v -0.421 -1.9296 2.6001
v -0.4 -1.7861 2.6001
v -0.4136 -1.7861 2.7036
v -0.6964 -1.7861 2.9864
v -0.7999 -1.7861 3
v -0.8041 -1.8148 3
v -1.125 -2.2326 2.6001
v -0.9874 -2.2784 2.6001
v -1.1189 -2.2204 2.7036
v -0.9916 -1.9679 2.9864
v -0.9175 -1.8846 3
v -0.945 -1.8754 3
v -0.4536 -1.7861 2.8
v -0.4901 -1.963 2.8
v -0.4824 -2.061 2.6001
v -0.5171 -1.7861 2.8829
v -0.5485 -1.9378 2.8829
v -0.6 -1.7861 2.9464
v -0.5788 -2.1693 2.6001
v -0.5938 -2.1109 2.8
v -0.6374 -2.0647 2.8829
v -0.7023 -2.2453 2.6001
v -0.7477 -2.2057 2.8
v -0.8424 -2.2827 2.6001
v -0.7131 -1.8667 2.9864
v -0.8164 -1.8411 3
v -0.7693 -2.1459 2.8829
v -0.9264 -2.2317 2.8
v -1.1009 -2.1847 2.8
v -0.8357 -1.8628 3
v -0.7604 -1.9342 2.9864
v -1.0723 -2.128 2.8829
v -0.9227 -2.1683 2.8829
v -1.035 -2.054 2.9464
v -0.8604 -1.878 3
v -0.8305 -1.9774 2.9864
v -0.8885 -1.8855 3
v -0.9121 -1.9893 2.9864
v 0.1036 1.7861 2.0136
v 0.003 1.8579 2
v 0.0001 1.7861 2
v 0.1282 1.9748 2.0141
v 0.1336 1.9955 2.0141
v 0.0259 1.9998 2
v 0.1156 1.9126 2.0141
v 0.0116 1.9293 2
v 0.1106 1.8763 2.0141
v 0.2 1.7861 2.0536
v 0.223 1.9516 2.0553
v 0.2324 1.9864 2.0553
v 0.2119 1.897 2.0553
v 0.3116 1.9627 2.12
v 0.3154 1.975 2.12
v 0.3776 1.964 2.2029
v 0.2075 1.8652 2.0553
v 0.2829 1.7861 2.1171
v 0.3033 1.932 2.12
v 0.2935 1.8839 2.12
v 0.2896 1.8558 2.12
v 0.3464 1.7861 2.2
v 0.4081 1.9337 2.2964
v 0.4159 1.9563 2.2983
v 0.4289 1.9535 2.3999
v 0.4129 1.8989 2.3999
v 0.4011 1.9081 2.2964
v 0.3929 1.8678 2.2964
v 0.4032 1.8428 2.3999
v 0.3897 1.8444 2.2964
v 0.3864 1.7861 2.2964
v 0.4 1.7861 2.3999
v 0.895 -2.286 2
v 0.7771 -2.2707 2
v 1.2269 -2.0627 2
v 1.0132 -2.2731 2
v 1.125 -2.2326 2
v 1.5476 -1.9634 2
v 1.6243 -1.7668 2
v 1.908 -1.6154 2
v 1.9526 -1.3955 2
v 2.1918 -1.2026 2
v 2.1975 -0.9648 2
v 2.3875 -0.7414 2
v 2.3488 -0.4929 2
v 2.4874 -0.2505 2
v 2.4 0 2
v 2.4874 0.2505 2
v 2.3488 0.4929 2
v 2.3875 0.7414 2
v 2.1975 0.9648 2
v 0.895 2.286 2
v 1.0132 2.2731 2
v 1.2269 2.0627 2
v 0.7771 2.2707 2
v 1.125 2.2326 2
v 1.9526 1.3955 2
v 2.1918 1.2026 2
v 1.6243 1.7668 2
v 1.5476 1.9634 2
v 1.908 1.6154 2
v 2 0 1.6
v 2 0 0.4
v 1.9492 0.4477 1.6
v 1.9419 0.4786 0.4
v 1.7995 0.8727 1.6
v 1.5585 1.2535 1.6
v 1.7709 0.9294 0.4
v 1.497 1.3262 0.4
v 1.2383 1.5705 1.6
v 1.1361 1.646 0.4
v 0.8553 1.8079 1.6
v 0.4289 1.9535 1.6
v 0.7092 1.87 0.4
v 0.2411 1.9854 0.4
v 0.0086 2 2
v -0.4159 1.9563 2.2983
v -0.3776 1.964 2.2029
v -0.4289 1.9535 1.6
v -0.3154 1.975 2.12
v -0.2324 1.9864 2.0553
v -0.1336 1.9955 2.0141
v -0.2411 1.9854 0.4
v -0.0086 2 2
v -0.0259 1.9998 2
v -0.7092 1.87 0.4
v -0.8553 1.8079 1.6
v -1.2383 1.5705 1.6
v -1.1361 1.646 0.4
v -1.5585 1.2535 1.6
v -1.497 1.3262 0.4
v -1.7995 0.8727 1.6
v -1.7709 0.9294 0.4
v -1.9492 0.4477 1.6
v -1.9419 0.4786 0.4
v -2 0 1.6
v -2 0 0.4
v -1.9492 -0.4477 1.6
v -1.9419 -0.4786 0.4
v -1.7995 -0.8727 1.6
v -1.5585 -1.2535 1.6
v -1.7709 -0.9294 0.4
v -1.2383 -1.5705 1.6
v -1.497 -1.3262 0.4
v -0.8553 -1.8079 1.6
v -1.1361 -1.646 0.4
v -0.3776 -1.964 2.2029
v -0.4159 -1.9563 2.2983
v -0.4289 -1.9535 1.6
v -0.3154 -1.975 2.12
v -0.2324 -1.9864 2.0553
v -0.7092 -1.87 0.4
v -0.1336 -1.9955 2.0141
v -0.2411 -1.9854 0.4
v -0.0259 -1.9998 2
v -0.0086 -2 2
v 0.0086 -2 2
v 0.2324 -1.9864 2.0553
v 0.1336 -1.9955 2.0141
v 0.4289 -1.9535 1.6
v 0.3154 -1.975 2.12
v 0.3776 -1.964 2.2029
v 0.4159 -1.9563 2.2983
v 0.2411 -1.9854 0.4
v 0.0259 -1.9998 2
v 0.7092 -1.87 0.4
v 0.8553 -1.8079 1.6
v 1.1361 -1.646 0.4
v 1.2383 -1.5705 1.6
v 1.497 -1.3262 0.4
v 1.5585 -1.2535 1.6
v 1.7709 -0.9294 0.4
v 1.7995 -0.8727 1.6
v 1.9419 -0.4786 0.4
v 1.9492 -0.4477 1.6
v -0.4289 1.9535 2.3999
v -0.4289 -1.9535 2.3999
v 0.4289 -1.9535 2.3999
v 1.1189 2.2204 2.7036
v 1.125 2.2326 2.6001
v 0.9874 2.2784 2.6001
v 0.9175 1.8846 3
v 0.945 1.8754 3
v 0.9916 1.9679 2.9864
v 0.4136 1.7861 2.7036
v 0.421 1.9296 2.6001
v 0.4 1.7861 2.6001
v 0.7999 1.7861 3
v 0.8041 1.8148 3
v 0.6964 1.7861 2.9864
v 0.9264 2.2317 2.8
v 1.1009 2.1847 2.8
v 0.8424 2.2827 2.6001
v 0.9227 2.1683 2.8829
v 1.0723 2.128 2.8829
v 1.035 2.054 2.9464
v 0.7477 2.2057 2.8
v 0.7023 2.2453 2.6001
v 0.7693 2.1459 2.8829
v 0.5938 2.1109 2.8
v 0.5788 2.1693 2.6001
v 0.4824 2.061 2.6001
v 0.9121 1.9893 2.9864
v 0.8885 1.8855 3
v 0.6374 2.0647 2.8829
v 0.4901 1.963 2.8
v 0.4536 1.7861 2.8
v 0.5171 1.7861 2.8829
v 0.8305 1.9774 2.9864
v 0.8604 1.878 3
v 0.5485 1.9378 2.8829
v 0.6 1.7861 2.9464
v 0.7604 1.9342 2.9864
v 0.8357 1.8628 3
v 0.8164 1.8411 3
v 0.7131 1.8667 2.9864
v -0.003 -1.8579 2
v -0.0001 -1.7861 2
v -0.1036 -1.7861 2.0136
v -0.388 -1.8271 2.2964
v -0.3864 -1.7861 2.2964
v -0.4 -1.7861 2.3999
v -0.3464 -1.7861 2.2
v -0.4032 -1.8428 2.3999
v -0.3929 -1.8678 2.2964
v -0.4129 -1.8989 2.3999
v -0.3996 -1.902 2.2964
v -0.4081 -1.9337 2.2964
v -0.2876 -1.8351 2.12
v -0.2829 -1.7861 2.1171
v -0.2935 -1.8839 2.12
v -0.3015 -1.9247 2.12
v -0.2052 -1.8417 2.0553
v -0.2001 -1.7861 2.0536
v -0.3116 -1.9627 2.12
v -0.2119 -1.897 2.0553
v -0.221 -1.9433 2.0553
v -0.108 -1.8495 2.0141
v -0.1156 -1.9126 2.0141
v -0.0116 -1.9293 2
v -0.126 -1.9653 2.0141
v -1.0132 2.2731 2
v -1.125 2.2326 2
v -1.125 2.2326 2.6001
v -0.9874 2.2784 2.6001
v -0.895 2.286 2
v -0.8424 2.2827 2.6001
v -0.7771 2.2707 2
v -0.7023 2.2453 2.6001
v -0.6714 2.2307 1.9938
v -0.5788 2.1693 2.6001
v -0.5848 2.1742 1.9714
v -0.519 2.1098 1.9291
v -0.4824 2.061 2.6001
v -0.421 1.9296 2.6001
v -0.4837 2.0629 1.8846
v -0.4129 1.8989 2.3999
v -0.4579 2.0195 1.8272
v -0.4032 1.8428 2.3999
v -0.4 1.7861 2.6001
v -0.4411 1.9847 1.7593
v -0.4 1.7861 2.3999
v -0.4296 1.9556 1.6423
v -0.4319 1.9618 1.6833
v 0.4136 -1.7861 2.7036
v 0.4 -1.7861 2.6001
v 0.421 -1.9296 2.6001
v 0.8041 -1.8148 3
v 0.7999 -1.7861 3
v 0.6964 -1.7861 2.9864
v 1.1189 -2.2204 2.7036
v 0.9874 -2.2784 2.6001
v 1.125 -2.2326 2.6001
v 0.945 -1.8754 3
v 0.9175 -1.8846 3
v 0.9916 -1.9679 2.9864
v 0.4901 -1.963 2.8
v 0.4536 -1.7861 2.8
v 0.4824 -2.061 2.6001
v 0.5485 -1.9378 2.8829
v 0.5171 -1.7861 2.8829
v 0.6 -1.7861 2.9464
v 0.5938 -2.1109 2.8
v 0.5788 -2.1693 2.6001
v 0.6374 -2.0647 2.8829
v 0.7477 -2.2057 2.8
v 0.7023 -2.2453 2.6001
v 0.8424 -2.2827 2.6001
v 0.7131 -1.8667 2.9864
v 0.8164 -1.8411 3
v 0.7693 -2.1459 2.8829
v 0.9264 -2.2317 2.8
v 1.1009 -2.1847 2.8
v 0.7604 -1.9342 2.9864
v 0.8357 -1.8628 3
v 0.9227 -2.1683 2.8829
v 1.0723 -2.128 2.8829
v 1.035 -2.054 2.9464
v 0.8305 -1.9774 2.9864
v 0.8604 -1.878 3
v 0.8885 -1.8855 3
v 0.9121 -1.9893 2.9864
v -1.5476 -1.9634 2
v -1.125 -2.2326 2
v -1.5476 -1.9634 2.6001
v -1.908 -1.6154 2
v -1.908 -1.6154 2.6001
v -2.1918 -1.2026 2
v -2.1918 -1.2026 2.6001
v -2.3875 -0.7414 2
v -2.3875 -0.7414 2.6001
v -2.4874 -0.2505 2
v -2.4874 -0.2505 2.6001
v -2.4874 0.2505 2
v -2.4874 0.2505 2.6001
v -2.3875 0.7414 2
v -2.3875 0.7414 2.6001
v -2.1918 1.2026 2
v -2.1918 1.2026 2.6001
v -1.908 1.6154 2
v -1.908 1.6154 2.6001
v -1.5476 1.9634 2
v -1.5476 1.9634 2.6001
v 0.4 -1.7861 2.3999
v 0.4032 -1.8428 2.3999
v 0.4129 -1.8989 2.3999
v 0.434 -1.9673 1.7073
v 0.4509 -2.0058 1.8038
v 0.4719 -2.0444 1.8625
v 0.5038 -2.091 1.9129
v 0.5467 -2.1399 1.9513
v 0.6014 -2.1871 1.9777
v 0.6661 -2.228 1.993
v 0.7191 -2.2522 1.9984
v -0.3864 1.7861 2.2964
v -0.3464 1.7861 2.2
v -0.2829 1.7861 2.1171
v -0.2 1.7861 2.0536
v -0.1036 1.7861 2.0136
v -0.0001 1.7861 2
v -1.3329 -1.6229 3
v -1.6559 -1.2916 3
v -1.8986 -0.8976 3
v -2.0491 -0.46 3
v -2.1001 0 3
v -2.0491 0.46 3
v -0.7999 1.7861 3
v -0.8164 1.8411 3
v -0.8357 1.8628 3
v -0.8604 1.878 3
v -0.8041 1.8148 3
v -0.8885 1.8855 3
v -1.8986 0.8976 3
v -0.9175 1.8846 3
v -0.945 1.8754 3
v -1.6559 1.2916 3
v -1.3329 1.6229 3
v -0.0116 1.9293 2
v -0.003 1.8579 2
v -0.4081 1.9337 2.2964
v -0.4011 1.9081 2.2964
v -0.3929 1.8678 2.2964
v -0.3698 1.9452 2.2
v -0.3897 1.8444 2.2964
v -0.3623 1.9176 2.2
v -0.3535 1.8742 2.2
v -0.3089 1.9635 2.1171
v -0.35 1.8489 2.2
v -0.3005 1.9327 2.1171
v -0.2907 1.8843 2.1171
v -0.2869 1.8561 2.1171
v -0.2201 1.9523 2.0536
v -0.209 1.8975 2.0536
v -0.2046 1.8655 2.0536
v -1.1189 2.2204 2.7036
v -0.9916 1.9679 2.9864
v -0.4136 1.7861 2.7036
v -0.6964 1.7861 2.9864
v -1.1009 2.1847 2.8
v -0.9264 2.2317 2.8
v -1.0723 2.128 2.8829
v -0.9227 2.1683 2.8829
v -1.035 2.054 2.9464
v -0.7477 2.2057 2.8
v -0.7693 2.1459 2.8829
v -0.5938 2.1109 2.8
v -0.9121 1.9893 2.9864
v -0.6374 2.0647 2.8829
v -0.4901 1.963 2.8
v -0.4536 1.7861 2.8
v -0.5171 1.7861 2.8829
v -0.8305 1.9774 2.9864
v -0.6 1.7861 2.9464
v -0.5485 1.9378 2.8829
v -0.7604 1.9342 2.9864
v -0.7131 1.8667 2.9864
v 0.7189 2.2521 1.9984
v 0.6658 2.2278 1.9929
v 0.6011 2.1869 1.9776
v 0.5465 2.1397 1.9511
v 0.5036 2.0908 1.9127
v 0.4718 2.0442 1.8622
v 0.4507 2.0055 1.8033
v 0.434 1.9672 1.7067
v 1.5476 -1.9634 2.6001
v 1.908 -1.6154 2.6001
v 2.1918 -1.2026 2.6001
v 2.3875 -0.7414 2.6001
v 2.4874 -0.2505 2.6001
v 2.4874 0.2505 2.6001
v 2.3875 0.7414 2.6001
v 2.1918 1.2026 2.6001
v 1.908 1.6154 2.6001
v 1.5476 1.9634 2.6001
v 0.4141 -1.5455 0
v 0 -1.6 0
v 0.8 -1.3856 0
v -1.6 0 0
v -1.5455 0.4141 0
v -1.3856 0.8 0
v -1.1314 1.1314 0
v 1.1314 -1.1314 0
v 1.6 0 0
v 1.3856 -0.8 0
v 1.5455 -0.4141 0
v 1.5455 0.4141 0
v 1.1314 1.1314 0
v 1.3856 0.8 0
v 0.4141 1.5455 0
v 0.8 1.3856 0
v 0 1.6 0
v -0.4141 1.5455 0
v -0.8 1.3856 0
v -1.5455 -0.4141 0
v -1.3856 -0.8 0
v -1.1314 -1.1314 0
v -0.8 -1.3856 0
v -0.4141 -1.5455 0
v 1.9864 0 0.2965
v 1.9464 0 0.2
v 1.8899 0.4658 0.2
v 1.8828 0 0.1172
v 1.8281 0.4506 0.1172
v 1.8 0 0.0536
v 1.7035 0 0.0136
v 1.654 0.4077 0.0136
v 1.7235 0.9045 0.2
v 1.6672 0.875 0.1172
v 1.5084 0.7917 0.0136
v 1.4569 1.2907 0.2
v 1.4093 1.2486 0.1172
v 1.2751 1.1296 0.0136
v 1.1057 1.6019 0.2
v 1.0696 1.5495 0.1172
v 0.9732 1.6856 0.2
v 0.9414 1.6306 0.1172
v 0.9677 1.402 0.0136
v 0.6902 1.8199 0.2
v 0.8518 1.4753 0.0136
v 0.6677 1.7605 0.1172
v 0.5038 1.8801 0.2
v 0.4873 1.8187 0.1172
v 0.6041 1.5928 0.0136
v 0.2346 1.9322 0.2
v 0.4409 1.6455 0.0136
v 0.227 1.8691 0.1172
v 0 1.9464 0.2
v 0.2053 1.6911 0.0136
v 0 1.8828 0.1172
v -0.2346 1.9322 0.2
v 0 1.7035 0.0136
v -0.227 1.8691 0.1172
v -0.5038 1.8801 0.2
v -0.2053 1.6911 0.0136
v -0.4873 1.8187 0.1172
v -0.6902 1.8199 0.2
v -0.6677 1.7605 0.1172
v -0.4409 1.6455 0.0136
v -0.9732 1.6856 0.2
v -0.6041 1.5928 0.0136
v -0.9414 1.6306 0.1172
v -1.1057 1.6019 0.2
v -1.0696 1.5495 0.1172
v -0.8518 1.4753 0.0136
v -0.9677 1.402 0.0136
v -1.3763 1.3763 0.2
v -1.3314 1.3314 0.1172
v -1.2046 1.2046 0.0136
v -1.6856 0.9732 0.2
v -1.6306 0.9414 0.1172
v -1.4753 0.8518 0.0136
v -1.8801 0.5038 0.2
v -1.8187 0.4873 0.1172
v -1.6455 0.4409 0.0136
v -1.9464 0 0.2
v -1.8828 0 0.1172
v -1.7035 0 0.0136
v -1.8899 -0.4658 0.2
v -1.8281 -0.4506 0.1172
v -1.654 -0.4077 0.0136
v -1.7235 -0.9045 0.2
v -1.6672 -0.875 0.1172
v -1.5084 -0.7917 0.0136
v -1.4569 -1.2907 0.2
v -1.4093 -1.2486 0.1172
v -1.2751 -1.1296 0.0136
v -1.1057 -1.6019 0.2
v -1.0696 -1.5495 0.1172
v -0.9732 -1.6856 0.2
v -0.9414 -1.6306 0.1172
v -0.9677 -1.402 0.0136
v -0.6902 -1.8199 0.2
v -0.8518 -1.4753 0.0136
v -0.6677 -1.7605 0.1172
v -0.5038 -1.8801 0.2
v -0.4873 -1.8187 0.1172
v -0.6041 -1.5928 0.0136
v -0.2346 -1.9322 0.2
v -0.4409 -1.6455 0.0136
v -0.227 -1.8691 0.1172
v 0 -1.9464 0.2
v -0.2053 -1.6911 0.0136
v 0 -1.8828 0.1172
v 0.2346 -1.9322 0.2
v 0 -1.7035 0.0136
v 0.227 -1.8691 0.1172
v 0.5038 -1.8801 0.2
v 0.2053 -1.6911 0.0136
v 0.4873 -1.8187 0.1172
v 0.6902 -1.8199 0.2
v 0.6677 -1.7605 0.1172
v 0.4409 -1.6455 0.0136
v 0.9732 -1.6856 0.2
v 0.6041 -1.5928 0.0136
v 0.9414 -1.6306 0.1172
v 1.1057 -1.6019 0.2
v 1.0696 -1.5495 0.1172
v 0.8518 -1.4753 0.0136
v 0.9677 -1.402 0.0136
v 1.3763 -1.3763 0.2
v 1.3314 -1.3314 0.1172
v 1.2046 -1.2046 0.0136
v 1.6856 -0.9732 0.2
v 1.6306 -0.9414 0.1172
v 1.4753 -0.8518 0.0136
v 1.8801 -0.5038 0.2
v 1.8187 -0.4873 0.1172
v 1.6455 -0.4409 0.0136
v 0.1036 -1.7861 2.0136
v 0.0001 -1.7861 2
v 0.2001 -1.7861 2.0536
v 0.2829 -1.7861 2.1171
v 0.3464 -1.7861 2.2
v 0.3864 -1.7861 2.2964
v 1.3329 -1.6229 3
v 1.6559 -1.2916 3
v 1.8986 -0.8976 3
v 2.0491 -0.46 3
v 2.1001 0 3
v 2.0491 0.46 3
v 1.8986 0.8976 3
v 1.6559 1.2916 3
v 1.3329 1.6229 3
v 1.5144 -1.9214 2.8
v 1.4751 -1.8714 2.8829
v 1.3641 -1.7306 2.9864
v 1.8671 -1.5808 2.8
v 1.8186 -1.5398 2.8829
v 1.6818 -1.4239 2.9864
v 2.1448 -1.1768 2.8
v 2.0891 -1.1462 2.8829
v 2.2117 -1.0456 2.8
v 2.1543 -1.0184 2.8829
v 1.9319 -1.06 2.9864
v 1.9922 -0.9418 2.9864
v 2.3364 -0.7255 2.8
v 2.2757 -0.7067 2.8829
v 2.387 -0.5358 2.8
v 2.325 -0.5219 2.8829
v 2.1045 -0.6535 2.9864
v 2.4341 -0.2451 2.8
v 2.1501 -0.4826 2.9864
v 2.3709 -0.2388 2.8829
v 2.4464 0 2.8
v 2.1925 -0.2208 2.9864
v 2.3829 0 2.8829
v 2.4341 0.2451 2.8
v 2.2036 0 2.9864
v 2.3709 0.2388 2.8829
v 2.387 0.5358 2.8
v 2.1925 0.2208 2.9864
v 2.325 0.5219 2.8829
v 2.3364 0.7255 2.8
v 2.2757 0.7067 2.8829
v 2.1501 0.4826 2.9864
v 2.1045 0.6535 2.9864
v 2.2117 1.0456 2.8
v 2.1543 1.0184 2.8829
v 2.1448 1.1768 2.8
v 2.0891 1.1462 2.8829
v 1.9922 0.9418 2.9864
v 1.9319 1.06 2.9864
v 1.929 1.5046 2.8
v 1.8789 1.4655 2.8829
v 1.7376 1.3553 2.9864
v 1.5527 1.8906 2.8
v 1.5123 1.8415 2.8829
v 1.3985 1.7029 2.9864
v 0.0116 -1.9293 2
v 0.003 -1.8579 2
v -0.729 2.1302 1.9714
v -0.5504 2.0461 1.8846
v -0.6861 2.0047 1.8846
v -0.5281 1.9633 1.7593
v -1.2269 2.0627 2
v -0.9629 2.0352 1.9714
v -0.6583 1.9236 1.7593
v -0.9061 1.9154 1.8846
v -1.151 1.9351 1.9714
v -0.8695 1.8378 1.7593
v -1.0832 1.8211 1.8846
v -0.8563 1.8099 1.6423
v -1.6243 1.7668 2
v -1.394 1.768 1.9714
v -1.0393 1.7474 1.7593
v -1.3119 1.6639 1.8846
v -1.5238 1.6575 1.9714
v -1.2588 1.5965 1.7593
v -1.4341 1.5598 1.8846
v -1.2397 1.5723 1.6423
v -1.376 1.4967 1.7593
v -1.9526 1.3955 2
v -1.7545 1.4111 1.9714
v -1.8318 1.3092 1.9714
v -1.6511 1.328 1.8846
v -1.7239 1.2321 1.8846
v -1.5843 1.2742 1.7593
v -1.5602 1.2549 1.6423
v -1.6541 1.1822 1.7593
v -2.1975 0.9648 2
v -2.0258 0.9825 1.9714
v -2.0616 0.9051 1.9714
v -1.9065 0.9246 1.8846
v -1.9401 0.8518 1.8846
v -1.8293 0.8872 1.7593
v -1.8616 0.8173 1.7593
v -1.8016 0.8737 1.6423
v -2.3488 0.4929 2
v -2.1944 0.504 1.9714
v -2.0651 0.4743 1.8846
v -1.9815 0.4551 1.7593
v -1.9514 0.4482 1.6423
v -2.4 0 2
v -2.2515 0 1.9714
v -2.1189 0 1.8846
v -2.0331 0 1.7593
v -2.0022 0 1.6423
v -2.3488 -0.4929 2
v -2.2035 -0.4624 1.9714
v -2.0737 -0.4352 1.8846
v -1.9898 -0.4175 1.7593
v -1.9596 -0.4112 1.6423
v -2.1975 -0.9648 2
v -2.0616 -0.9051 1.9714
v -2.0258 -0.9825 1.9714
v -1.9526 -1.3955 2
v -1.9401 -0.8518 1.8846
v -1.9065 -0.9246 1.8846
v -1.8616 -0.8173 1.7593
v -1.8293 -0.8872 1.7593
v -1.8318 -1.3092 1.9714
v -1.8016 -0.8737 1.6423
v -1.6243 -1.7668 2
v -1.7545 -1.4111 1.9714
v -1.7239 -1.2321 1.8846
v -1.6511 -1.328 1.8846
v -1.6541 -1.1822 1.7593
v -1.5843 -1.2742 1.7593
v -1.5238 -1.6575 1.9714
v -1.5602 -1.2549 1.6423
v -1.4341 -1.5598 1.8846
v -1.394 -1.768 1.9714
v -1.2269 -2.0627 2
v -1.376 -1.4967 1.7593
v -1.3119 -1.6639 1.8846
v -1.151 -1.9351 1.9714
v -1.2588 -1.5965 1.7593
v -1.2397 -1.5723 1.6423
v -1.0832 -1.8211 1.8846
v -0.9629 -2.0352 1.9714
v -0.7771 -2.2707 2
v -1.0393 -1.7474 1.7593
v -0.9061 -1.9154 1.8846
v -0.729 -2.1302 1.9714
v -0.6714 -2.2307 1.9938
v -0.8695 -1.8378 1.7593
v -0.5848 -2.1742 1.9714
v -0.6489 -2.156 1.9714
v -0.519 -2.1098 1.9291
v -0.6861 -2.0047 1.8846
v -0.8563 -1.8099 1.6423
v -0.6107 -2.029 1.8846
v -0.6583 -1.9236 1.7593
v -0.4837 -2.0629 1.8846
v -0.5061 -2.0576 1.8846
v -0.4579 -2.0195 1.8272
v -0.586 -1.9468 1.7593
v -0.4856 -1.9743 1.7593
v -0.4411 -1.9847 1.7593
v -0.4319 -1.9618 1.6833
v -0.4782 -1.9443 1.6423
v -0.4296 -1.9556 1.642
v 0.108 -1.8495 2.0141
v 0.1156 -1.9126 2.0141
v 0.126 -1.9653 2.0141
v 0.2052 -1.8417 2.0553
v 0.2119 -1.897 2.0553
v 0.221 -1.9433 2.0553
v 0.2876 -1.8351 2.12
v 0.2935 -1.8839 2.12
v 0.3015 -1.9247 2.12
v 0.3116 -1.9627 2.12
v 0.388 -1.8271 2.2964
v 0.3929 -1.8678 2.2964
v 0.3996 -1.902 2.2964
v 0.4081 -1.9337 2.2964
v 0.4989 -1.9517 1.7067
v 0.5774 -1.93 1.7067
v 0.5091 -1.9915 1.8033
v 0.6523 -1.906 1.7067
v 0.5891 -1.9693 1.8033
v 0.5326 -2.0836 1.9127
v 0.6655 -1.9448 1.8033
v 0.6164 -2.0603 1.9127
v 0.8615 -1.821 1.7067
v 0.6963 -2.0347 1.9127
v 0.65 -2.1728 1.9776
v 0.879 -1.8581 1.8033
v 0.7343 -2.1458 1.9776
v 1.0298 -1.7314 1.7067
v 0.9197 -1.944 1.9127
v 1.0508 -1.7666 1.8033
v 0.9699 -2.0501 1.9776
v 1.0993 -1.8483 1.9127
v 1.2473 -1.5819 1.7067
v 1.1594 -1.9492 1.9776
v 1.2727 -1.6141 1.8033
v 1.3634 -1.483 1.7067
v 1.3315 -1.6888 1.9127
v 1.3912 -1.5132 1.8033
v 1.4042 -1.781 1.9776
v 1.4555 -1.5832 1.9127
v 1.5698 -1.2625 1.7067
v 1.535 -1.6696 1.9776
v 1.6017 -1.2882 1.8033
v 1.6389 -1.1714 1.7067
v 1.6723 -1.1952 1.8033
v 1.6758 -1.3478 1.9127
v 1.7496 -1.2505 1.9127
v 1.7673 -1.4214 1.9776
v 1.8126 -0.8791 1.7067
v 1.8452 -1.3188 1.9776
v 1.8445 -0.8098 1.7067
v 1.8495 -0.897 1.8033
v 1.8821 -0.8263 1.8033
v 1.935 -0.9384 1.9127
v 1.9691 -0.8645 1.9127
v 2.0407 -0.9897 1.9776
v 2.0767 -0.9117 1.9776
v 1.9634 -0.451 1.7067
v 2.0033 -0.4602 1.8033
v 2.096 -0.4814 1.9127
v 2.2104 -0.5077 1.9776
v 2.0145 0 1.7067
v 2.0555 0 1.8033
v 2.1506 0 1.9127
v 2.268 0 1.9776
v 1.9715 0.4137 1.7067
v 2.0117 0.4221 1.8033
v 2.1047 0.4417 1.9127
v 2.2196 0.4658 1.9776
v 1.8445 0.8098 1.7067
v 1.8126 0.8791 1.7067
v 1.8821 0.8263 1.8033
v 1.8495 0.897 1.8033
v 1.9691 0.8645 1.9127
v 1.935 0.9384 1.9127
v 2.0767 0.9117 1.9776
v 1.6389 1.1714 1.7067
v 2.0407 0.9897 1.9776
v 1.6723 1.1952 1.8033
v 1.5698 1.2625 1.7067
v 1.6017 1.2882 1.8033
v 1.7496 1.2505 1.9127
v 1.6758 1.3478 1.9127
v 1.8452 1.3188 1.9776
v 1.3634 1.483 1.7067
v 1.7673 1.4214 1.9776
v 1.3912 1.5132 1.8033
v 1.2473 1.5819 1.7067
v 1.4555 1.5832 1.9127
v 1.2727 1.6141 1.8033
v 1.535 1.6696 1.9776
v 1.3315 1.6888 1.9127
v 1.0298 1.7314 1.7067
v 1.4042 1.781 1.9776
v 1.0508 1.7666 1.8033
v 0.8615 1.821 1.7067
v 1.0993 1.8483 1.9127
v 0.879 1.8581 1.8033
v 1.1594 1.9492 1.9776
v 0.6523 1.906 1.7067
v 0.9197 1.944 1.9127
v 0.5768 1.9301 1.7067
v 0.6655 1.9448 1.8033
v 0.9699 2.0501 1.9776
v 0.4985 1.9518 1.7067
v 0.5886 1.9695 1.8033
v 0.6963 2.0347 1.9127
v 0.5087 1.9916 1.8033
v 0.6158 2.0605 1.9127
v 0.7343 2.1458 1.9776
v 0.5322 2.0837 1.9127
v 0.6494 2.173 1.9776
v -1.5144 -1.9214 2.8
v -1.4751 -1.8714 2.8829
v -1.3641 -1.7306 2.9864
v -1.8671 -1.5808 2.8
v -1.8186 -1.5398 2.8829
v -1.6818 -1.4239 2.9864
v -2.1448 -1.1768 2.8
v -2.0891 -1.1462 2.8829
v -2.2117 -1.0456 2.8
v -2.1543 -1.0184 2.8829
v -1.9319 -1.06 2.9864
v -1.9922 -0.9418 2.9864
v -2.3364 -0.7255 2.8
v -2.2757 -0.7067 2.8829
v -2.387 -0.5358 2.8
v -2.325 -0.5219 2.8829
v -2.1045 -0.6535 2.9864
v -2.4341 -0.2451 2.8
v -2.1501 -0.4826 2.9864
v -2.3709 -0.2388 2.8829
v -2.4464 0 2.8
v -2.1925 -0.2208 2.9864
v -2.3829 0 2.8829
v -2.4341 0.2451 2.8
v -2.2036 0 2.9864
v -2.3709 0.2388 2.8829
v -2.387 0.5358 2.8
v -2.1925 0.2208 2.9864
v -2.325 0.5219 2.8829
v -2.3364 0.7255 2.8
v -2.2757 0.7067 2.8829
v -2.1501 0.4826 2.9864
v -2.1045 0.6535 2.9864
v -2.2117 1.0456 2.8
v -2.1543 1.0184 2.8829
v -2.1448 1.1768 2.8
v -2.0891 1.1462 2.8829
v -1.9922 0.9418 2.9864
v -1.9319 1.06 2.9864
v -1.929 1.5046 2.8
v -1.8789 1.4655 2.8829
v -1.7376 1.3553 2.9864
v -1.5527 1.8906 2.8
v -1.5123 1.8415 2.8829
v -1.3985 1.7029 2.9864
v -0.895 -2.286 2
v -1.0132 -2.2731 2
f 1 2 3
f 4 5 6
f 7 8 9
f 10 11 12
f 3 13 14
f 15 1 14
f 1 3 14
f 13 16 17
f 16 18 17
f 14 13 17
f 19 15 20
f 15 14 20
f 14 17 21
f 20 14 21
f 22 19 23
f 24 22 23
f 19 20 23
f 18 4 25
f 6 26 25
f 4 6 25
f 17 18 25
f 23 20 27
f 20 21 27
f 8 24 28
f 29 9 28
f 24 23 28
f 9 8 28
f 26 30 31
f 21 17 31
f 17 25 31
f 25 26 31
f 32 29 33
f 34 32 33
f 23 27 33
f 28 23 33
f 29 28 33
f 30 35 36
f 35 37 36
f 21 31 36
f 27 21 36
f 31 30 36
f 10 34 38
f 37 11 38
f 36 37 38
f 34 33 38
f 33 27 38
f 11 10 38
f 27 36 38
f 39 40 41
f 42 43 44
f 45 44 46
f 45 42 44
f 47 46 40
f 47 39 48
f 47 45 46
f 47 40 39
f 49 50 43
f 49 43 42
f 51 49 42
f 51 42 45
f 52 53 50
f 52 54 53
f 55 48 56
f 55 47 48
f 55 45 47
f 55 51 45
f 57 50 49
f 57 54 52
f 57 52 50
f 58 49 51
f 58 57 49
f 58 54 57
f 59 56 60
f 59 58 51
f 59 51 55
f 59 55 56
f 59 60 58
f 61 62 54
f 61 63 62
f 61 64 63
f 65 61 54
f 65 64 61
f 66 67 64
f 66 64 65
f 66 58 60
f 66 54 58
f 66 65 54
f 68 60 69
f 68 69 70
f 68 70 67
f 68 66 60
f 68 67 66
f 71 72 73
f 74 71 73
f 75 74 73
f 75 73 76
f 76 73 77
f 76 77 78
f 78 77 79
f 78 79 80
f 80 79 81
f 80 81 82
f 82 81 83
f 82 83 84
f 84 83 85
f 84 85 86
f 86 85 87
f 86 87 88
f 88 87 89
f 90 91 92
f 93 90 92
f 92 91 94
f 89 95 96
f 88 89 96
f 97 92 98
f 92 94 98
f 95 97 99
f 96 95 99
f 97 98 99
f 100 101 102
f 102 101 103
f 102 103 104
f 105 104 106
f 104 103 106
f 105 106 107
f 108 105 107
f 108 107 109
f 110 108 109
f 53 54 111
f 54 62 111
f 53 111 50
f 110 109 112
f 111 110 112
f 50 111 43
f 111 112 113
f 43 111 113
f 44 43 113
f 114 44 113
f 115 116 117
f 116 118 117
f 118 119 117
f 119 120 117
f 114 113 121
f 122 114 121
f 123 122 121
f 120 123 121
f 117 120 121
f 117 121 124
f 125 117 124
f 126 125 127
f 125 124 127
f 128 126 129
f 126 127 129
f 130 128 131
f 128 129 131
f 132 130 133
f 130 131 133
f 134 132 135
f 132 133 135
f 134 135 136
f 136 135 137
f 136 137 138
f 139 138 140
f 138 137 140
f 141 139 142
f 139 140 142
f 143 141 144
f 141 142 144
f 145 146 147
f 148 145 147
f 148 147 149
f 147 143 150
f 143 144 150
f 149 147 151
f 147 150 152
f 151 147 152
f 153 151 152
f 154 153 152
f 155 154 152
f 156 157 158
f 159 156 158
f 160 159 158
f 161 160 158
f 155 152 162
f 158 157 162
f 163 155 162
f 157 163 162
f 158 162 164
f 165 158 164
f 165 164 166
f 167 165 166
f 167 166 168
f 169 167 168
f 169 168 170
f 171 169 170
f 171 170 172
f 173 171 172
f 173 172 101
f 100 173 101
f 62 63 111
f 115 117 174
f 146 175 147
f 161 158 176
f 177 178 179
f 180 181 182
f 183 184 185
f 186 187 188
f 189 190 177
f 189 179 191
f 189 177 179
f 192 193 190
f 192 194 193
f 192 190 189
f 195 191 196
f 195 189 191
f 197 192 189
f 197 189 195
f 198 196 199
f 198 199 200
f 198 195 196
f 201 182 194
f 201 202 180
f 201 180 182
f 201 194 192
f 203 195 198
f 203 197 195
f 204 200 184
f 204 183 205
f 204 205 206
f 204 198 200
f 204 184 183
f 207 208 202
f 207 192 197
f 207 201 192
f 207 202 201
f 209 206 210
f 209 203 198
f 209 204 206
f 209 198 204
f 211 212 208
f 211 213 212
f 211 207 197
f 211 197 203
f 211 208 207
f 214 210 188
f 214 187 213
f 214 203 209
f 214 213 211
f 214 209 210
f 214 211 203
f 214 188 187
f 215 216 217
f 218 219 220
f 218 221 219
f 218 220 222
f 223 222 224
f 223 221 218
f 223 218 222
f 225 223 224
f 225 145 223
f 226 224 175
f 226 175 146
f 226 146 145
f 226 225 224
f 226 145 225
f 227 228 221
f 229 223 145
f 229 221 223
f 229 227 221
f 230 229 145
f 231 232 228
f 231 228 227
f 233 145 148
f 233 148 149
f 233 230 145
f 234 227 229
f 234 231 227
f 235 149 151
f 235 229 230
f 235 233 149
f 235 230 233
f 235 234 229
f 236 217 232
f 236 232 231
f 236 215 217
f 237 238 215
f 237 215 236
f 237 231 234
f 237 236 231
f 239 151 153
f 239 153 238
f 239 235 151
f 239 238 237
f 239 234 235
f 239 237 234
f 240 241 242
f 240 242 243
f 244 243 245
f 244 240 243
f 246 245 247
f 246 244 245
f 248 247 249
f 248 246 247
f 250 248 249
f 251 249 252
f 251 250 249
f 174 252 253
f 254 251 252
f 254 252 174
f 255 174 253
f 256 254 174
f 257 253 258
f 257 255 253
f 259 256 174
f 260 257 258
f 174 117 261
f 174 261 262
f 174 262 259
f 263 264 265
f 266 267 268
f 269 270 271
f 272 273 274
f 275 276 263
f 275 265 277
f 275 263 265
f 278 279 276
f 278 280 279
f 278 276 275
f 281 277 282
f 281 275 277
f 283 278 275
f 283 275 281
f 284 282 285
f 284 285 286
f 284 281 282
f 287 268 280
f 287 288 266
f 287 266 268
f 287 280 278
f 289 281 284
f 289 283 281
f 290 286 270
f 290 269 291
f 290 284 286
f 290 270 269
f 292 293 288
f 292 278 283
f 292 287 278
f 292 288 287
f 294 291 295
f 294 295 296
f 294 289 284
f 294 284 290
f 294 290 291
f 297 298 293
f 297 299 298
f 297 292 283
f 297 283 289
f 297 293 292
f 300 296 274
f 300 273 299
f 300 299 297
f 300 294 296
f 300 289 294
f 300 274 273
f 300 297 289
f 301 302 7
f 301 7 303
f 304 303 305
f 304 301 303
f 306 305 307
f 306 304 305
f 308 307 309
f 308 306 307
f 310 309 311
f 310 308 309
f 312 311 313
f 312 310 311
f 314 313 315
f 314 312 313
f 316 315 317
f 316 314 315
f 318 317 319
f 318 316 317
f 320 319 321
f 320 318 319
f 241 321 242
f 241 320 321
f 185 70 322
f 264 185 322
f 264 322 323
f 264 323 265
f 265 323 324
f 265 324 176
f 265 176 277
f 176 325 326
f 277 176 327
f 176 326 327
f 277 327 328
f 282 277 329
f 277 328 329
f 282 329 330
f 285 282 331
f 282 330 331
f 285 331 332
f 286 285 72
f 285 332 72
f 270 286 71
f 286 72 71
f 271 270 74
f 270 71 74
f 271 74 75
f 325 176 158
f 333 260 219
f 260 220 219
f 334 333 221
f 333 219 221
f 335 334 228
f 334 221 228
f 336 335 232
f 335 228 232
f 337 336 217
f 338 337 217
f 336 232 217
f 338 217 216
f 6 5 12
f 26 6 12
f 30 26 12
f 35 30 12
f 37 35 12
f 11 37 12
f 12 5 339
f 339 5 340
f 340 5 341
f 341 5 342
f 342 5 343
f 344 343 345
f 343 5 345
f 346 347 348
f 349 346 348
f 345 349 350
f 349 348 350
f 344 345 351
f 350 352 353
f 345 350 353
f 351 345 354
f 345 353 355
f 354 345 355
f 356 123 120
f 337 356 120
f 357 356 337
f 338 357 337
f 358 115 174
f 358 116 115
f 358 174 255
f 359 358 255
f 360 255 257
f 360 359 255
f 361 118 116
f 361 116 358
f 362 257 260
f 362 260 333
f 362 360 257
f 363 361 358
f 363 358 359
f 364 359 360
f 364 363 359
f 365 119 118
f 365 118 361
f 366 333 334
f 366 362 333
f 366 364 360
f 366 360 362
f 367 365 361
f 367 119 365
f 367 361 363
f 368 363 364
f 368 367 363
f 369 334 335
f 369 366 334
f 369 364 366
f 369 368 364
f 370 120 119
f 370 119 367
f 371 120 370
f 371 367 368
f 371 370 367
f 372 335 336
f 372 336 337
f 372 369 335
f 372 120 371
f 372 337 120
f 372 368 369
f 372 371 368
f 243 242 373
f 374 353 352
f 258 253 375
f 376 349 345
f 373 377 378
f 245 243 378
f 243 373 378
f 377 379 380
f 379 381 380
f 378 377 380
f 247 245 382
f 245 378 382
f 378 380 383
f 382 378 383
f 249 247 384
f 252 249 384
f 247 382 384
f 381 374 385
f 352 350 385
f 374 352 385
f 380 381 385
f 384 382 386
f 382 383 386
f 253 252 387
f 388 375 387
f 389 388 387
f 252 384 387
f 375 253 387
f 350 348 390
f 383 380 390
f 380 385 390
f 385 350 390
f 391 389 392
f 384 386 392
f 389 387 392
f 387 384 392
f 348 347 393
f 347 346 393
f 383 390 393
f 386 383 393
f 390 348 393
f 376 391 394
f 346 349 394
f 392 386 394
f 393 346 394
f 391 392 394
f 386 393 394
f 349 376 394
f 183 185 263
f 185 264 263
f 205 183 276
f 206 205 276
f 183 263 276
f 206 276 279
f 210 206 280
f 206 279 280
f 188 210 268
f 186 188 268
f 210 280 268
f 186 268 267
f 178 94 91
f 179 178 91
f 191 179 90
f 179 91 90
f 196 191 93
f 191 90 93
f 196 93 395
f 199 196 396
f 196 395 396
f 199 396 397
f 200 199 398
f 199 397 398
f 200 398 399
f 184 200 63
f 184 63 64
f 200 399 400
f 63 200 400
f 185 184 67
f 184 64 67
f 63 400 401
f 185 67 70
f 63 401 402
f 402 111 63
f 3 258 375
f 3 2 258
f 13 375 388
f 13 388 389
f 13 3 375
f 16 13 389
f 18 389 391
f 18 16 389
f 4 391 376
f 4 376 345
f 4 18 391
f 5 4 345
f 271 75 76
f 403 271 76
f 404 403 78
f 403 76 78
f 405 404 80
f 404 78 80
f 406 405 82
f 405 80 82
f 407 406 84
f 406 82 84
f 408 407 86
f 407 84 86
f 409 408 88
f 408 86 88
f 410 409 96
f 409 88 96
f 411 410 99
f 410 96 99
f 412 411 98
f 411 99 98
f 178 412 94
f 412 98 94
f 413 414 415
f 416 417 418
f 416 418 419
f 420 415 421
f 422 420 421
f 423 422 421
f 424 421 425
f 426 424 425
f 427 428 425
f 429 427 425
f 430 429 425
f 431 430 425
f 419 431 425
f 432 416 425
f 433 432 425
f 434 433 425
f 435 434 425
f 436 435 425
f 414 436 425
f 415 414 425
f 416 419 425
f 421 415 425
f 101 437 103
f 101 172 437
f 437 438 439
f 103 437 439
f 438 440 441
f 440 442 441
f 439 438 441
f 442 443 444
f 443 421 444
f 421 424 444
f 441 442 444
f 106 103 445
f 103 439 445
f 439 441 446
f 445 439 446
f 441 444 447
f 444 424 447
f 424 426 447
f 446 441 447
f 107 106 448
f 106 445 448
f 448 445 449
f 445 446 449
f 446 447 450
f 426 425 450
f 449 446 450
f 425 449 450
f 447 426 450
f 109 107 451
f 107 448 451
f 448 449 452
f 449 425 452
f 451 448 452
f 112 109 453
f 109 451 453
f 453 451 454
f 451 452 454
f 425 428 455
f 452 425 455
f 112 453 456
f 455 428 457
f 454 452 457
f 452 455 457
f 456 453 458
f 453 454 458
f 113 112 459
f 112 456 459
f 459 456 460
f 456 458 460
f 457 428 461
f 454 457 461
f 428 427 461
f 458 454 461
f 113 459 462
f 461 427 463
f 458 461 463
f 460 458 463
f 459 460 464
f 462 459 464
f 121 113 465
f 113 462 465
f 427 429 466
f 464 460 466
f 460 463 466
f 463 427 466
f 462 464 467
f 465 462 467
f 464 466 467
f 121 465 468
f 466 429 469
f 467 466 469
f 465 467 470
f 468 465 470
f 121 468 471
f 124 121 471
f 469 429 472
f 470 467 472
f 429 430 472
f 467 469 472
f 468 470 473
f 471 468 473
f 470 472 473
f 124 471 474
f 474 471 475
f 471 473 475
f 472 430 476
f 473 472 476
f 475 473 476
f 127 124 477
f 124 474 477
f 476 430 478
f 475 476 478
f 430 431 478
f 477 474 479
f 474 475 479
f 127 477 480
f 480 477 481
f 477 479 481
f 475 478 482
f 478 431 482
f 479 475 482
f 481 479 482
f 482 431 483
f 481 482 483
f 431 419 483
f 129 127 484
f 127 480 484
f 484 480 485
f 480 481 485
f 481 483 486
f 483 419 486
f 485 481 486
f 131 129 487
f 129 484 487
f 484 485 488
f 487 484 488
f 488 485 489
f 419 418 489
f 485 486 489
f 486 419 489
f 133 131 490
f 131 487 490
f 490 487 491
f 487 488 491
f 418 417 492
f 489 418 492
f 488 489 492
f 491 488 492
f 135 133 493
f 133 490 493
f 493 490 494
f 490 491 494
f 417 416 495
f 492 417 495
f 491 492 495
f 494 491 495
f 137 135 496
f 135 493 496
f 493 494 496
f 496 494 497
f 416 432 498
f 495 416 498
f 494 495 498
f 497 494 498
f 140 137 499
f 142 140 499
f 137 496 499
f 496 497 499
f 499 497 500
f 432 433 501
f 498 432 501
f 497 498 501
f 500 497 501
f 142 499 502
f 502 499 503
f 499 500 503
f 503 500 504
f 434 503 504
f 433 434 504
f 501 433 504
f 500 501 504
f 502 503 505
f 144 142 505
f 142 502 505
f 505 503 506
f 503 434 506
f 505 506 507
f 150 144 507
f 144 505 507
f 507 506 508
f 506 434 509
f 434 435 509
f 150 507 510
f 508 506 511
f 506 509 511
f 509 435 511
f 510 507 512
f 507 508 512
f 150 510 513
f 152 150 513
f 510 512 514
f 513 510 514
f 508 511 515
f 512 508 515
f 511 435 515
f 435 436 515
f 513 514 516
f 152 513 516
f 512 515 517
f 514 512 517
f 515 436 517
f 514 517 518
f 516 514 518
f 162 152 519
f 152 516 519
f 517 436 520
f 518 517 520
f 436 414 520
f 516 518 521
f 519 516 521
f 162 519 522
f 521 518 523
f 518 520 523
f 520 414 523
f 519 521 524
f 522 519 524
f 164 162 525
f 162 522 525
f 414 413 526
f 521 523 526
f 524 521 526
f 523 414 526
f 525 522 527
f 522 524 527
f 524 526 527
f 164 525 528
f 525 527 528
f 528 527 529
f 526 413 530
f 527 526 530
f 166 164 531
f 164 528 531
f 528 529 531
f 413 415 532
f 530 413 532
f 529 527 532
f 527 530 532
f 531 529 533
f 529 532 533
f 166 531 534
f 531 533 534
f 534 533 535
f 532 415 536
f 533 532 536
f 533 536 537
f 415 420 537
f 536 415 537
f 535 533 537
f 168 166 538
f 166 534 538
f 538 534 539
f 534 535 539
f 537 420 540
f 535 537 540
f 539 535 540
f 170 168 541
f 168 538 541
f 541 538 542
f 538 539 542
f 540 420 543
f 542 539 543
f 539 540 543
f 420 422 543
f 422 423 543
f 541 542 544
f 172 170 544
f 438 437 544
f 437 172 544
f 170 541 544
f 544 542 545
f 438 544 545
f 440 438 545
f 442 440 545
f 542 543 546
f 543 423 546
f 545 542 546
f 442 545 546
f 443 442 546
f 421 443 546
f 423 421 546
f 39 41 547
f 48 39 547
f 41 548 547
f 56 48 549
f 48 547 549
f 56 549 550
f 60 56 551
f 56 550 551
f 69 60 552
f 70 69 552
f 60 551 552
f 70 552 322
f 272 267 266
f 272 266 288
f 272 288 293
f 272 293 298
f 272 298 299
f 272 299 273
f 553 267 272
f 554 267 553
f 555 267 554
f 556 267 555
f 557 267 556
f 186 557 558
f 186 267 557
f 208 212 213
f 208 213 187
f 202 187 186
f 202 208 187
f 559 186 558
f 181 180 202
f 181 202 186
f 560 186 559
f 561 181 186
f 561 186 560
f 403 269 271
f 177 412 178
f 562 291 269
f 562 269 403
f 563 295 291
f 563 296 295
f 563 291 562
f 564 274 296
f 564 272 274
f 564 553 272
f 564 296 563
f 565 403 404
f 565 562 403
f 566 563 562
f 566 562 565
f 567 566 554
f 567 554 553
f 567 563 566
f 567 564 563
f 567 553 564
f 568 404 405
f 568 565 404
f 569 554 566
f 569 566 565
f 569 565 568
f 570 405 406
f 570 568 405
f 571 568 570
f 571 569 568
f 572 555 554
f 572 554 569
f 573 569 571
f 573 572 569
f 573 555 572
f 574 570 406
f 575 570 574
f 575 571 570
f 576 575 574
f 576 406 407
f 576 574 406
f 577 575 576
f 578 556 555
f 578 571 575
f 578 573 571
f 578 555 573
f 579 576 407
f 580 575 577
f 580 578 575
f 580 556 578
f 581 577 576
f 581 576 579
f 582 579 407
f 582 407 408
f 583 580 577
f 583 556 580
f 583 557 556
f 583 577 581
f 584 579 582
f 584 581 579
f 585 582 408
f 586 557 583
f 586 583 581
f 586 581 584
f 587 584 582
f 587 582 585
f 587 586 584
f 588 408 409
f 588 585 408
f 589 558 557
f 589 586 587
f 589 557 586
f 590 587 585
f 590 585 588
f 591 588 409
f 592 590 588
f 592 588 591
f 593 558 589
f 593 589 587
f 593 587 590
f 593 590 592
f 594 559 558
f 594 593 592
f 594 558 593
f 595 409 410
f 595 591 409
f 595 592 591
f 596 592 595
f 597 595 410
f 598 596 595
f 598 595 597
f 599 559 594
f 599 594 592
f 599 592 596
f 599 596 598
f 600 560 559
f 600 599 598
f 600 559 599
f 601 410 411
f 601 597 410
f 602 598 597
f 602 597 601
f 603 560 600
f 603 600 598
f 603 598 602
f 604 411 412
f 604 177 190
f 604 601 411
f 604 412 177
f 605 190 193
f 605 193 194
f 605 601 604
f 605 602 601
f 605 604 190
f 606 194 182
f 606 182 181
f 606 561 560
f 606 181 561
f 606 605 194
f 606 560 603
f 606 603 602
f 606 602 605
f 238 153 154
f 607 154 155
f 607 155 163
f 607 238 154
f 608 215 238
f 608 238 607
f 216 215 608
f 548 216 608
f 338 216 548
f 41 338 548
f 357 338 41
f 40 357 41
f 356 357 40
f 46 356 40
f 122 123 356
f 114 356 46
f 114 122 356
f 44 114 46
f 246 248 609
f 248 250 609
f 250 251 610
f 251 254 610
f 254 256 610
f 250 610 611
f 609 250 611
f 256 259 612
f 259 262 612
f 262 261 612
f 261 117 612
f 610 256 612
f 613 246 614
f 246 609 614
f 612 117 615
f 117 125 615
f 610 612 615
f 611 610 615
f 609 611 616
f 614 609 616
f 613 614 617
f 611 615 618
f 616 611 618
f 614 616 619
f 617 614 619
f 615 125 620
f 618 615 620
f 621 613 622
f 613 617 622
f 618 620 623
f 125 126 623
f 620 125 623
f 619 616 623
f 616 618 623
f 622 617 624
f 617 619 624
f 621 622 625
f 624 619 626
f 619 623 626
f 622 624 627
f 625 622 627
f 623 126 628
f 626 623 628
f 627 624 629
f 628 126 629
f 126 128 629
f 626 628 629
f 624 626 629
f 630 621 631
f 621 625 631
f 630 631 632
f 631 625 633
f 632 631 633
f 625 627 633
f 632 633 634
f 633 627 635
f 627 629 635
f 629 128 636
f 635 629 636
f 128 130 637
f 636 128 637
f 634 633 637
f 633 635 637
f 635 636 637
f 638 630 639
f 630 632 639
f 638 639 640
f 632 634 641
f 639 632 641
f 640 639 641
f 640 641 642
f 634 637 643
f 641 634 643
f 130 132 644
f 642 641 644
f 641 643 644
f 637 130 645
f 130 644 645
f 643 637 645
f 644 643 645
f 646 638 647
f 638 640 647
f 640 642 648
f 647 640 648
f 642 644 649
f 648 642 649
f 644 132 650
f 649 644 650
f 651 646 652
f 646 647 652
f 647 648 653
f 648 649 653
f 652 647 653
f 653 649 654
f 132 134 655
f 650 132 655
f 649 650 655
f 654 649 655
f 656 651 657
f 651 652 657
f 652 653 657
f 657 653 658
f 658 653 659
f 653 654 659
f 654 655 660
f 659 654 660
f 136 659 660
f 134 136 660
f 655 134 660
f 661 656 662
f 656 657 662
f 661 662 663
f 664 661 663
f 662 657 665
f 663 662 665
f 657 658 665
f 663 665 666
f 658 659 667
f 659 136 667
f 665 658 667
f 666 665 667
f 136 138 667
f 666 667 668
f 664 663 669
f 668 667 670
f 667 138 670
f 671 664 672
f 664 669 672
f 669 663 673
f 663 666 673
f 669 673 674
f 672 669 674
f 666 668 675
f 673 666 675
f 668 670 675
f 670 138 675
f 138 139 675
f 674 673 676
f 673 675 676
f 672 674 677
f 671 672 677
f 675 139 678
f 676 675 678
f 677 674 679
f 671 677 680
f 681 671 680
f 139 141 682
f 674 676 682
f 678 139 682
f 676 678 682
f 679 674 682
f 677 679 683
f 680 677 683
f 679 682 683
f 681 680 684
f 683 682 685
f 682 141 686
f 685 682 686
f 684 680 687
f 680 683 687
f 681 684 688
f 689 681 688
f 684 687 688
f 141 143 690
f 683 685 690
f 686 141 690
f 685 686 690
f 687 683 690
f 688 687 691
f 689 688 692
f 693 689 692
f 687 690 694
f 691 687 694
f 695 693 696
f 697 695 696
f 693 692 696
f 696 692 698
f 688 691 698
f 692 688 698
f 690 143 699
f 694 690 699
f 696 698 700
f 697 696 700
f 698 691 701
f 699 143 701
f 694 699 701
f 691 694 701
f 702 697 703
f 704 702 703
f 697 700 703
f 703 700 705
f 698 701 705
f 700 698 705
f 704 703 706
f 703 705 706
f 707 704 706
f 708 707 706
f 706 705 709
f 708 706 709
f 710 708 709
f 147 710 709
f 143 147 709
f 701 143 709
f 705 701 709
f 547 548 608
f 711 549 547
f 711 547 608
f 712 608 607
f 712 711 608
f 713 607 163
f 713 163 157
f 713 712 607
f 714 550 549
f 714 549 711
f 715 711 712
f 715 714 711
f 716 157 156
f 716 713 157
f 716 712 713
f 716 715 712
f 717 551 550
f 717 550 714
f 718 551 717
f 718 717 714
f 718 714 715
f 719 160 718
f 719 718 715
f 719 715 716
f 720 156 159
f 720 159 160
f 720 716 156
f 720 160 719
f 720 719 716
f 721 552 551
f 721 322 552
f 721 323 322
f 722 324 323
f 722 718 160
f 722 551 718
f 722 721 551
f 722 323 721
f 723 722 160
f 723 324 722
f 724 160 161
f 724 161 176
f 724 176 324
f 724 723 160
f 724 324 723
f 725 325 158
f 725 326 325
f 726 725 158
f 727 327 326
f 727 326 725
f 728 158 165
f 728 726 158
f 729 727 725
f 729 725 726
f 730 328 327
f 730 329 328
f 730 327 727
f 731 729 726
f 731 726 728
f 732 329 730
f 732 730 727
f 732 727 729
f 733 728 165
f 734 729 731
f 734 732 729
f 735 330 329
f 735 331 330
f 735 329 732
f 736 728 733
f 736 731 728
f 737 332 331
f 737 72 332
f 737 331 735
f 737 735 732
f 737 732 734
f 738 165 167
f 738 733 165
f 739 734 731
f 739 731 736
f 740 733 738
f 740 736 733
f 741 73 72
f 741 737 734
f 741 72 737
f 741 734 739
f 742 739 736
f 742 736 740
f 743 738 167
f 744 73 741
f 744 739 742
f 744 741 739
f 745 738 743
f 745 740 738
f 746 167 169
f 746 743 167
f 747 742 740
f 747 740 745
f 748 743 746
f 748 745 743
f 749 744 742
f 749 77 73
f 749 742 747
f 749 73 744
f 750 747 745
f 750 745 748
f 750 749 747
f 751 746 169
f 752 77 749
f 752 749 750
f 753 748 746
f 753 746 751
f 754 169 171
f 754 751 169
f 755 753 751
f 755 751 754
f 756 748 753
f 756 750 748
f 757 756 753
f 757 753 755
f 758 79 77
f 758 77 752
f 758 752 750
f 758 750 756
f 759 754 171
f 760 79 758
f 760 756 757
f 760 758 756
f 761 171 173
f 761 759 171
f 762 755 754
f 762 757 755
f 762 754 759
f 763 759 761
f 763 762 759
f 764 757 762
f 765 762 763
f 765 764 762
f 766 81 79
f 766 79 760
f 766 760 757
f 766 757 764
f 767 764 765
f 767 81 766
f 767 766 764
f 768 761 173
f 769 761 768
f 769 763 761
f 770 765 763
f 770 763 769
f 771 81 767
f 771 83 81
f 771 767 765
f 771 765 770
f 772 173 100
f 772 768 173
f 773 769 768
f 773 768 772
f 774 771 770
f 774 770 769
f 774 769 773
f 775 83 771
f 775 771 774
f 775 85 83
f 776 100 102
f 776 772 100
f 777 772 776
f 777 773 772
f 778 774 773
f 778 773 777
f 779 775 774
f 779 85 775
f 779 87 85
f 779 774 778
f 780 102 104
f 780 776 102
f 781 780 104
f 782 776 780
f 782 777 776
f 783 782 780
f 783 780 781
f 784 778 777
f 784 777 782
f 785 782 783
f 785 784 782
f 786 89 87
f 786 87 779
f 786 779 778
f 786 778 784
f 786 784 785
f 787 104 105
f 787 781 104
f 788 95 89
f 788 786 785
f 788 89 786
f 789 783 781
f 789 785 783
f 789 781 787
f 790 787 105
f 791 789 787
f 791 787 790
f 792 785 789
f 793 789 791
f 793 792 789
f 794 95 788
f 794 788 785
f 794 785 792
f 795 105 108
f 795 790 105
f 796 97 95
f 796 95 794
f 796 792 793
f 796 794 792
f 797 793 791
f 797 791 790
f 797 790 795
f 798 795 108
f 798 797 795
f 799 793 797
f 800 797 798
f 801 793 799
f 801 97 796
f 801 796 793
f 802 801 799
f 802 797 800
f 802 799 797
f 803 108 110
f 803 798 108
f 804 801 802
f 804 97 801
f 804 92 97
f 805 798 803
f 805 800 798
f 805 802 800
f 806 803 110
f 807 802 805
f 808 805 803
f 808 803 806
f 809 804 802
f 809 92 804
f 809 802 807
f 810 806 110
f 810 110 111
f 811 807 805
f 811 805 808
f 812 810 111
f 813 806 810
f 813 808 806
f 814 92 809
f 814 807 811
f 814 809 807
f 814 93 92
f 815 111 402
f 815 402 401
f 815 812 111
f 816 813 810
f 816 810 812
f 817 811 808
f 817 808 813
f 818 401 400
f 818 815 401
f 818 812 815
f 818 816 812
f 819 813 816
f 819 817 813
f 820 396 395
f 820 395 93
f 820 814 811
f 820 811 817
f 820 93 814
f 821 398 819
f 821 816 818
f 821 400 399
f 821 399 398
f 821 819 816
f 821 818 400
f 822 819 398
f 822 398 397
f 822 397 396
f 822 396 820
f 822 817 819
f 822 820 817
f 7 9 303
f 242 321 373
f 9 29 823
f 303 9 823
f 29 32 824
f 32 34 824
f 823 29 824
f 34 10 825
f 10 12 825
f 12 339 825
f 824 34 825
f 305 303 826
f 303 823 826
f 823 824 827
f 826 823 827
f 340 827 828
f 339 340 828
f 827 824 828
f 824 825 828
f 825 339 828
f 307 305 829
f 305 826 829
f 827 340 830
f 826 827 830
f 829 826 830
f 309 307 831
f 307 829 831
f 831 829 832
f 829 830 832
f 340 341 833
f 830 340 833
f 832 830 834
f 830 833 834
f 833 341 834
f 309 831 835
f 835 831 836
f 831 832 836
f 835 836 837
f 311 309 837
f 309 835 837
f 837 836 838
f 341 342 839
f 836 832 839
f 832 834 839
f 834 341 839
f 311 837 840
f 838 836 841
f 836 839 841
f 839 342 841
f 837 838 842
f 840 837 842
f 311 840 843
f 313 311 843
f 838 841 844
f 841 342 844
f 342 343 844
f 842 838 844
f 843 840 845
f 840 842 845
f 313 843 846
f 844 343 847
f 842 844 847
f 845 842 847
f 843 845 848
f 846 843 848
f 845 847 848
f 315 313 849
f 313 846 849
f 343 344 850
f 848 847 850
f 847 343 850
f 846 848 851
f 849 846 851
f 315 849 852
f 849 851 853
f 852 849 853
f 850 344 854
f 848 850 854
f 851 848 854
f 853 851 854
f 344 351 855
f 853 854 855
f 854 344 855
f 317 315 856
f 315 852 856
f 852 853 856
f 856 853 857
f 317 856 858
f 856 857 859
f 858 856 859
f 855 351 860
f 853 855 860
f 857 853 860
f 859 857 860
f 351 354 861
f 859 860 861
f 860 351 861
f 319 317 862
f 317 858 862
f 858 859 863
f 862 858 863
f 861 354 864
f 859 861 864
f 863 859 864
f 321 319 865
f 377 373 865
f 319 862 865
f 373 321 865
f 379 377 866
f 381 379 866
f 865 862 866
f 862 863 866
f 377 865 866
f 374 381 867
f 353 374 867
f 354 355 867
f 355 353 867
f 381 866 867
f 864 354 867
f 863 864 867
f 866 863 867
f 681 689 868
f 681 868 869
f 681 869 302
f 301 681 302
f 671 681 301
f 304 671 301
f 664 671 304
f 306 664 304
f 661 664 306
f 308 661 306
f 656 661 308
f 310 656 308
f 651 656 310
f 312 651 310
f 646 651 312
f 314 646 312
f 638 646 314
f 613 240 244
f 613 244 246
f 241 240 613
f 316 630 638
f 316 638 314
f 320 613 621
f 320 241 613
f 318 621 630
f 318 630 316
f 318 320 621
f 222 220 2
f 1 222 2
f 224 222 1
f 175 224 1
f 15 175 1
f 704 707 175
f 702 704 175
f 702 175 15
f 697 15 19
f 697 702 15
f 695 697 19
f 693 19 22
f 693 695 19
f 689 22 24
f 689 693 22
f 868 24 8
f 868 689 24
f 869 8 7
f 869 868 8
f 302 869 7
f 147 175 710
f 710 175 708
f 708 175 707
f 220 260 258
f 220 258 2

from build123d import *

# Parameters (mm, degrees)
ESQUISSE1_R        = 2
BOSS_EXTRU_1_DEPTH = 2
BOSS_EXTRU_2_DEPTH = 1
BOSS_EXTRU_3_DEPTH = 1
CONG_1_R           = 0.4
CONG_2_R           = 0.4


with BuildPart() as part:
    # Esquisse1 → Boss.-Extru.1 (new body)
    with BuildSketch(Plane.XY):
        Circle(ESQUISSE1_R)
    extrude(amount=BOSS_EXTRU_1_DEPTH)

    # Esquisse2 → Boss.-Extru.2 (add)
    with BuildSketch(Plane.XY.offset(2)):
        with BuildLine():
            Line((0.4, 1.78605711), (0.4, -1.78605711))
            ThreePointArc((0.4, -1.78605711), (0.637797788, -2.211791769), (1.125, -2.232571387))
            ThreePointArc((1.125, -2.232571387), (2.5, 0), (1.125, 2.232571387))
            ThreePointArc((1.125, 2.232571387), (0.637797788, 2.211791769), (0.4, 1.78605711))
        make_face()
    extrude(amount=BOSS_EXTRU_2_DEPTH)

    # Esquisse3 → Boss.-Extru.3 (add)
    with BuildSketch(Plane.XY.offset(2)):
        with BuildLine():
            Line((-0.4, 1.78605711), (-0.4, -1.78605711))
            ThreePointArc((-0.4, -1.78605711), (-0.637797788, -2.211791769), (-1.125, -2.232571387))
            ThreePointArc((-1.125, -2.232571387), (-2.5, 0), (-1.125, 2.232571387))
            ThreePointArc((-1.125, 2.232571387), (-0.637797788, 2.211791769), (-0.4, 1.78605711))
        make_face()
    extrude(amount=BOSS_EXTRU_3_DEPTH)

    # Congé1
    cong_1_edges = [part.edges().sort_by_distance(p)[0] for p in [
        (2.5, 0, 3),
        (-0.407268544, -1.871002459, 2),
        (-0.4, 0, 2),
        (-0.407268544, 1.871002459, 2),
        (-0.637797788, -2.211791769, 3),
        (-0.4, 0, 3),
        (-0.637797788, 2.211791769, 3),
        (-2.5, 0, 3),
        (0.407268544, 1.871002459, 2),
        (0.4, 0, 2),
        (0.407268544, -1.871002459, 2),
        (0.637797788, 2.211791769, 3),
        (0.4, 0, 3),
        (0.637797788, -2.211791769, 3),
    ]]
    fillet(cong_1_edges, radius=CONG_1_R - 0.0001)  # a hair under: the kernel refuses the full size

    # Congé2
    cong_2_edges = [part.edges().sort_by_distance(p)[0] for p in [
        (-2, 0, 0),
        (-2, 0, 2),
        (1.558480943, 1.253450099, 2),
    ]]
    fillet(cong_2_edges, radius=CONG_2_R)


solid = part.part
